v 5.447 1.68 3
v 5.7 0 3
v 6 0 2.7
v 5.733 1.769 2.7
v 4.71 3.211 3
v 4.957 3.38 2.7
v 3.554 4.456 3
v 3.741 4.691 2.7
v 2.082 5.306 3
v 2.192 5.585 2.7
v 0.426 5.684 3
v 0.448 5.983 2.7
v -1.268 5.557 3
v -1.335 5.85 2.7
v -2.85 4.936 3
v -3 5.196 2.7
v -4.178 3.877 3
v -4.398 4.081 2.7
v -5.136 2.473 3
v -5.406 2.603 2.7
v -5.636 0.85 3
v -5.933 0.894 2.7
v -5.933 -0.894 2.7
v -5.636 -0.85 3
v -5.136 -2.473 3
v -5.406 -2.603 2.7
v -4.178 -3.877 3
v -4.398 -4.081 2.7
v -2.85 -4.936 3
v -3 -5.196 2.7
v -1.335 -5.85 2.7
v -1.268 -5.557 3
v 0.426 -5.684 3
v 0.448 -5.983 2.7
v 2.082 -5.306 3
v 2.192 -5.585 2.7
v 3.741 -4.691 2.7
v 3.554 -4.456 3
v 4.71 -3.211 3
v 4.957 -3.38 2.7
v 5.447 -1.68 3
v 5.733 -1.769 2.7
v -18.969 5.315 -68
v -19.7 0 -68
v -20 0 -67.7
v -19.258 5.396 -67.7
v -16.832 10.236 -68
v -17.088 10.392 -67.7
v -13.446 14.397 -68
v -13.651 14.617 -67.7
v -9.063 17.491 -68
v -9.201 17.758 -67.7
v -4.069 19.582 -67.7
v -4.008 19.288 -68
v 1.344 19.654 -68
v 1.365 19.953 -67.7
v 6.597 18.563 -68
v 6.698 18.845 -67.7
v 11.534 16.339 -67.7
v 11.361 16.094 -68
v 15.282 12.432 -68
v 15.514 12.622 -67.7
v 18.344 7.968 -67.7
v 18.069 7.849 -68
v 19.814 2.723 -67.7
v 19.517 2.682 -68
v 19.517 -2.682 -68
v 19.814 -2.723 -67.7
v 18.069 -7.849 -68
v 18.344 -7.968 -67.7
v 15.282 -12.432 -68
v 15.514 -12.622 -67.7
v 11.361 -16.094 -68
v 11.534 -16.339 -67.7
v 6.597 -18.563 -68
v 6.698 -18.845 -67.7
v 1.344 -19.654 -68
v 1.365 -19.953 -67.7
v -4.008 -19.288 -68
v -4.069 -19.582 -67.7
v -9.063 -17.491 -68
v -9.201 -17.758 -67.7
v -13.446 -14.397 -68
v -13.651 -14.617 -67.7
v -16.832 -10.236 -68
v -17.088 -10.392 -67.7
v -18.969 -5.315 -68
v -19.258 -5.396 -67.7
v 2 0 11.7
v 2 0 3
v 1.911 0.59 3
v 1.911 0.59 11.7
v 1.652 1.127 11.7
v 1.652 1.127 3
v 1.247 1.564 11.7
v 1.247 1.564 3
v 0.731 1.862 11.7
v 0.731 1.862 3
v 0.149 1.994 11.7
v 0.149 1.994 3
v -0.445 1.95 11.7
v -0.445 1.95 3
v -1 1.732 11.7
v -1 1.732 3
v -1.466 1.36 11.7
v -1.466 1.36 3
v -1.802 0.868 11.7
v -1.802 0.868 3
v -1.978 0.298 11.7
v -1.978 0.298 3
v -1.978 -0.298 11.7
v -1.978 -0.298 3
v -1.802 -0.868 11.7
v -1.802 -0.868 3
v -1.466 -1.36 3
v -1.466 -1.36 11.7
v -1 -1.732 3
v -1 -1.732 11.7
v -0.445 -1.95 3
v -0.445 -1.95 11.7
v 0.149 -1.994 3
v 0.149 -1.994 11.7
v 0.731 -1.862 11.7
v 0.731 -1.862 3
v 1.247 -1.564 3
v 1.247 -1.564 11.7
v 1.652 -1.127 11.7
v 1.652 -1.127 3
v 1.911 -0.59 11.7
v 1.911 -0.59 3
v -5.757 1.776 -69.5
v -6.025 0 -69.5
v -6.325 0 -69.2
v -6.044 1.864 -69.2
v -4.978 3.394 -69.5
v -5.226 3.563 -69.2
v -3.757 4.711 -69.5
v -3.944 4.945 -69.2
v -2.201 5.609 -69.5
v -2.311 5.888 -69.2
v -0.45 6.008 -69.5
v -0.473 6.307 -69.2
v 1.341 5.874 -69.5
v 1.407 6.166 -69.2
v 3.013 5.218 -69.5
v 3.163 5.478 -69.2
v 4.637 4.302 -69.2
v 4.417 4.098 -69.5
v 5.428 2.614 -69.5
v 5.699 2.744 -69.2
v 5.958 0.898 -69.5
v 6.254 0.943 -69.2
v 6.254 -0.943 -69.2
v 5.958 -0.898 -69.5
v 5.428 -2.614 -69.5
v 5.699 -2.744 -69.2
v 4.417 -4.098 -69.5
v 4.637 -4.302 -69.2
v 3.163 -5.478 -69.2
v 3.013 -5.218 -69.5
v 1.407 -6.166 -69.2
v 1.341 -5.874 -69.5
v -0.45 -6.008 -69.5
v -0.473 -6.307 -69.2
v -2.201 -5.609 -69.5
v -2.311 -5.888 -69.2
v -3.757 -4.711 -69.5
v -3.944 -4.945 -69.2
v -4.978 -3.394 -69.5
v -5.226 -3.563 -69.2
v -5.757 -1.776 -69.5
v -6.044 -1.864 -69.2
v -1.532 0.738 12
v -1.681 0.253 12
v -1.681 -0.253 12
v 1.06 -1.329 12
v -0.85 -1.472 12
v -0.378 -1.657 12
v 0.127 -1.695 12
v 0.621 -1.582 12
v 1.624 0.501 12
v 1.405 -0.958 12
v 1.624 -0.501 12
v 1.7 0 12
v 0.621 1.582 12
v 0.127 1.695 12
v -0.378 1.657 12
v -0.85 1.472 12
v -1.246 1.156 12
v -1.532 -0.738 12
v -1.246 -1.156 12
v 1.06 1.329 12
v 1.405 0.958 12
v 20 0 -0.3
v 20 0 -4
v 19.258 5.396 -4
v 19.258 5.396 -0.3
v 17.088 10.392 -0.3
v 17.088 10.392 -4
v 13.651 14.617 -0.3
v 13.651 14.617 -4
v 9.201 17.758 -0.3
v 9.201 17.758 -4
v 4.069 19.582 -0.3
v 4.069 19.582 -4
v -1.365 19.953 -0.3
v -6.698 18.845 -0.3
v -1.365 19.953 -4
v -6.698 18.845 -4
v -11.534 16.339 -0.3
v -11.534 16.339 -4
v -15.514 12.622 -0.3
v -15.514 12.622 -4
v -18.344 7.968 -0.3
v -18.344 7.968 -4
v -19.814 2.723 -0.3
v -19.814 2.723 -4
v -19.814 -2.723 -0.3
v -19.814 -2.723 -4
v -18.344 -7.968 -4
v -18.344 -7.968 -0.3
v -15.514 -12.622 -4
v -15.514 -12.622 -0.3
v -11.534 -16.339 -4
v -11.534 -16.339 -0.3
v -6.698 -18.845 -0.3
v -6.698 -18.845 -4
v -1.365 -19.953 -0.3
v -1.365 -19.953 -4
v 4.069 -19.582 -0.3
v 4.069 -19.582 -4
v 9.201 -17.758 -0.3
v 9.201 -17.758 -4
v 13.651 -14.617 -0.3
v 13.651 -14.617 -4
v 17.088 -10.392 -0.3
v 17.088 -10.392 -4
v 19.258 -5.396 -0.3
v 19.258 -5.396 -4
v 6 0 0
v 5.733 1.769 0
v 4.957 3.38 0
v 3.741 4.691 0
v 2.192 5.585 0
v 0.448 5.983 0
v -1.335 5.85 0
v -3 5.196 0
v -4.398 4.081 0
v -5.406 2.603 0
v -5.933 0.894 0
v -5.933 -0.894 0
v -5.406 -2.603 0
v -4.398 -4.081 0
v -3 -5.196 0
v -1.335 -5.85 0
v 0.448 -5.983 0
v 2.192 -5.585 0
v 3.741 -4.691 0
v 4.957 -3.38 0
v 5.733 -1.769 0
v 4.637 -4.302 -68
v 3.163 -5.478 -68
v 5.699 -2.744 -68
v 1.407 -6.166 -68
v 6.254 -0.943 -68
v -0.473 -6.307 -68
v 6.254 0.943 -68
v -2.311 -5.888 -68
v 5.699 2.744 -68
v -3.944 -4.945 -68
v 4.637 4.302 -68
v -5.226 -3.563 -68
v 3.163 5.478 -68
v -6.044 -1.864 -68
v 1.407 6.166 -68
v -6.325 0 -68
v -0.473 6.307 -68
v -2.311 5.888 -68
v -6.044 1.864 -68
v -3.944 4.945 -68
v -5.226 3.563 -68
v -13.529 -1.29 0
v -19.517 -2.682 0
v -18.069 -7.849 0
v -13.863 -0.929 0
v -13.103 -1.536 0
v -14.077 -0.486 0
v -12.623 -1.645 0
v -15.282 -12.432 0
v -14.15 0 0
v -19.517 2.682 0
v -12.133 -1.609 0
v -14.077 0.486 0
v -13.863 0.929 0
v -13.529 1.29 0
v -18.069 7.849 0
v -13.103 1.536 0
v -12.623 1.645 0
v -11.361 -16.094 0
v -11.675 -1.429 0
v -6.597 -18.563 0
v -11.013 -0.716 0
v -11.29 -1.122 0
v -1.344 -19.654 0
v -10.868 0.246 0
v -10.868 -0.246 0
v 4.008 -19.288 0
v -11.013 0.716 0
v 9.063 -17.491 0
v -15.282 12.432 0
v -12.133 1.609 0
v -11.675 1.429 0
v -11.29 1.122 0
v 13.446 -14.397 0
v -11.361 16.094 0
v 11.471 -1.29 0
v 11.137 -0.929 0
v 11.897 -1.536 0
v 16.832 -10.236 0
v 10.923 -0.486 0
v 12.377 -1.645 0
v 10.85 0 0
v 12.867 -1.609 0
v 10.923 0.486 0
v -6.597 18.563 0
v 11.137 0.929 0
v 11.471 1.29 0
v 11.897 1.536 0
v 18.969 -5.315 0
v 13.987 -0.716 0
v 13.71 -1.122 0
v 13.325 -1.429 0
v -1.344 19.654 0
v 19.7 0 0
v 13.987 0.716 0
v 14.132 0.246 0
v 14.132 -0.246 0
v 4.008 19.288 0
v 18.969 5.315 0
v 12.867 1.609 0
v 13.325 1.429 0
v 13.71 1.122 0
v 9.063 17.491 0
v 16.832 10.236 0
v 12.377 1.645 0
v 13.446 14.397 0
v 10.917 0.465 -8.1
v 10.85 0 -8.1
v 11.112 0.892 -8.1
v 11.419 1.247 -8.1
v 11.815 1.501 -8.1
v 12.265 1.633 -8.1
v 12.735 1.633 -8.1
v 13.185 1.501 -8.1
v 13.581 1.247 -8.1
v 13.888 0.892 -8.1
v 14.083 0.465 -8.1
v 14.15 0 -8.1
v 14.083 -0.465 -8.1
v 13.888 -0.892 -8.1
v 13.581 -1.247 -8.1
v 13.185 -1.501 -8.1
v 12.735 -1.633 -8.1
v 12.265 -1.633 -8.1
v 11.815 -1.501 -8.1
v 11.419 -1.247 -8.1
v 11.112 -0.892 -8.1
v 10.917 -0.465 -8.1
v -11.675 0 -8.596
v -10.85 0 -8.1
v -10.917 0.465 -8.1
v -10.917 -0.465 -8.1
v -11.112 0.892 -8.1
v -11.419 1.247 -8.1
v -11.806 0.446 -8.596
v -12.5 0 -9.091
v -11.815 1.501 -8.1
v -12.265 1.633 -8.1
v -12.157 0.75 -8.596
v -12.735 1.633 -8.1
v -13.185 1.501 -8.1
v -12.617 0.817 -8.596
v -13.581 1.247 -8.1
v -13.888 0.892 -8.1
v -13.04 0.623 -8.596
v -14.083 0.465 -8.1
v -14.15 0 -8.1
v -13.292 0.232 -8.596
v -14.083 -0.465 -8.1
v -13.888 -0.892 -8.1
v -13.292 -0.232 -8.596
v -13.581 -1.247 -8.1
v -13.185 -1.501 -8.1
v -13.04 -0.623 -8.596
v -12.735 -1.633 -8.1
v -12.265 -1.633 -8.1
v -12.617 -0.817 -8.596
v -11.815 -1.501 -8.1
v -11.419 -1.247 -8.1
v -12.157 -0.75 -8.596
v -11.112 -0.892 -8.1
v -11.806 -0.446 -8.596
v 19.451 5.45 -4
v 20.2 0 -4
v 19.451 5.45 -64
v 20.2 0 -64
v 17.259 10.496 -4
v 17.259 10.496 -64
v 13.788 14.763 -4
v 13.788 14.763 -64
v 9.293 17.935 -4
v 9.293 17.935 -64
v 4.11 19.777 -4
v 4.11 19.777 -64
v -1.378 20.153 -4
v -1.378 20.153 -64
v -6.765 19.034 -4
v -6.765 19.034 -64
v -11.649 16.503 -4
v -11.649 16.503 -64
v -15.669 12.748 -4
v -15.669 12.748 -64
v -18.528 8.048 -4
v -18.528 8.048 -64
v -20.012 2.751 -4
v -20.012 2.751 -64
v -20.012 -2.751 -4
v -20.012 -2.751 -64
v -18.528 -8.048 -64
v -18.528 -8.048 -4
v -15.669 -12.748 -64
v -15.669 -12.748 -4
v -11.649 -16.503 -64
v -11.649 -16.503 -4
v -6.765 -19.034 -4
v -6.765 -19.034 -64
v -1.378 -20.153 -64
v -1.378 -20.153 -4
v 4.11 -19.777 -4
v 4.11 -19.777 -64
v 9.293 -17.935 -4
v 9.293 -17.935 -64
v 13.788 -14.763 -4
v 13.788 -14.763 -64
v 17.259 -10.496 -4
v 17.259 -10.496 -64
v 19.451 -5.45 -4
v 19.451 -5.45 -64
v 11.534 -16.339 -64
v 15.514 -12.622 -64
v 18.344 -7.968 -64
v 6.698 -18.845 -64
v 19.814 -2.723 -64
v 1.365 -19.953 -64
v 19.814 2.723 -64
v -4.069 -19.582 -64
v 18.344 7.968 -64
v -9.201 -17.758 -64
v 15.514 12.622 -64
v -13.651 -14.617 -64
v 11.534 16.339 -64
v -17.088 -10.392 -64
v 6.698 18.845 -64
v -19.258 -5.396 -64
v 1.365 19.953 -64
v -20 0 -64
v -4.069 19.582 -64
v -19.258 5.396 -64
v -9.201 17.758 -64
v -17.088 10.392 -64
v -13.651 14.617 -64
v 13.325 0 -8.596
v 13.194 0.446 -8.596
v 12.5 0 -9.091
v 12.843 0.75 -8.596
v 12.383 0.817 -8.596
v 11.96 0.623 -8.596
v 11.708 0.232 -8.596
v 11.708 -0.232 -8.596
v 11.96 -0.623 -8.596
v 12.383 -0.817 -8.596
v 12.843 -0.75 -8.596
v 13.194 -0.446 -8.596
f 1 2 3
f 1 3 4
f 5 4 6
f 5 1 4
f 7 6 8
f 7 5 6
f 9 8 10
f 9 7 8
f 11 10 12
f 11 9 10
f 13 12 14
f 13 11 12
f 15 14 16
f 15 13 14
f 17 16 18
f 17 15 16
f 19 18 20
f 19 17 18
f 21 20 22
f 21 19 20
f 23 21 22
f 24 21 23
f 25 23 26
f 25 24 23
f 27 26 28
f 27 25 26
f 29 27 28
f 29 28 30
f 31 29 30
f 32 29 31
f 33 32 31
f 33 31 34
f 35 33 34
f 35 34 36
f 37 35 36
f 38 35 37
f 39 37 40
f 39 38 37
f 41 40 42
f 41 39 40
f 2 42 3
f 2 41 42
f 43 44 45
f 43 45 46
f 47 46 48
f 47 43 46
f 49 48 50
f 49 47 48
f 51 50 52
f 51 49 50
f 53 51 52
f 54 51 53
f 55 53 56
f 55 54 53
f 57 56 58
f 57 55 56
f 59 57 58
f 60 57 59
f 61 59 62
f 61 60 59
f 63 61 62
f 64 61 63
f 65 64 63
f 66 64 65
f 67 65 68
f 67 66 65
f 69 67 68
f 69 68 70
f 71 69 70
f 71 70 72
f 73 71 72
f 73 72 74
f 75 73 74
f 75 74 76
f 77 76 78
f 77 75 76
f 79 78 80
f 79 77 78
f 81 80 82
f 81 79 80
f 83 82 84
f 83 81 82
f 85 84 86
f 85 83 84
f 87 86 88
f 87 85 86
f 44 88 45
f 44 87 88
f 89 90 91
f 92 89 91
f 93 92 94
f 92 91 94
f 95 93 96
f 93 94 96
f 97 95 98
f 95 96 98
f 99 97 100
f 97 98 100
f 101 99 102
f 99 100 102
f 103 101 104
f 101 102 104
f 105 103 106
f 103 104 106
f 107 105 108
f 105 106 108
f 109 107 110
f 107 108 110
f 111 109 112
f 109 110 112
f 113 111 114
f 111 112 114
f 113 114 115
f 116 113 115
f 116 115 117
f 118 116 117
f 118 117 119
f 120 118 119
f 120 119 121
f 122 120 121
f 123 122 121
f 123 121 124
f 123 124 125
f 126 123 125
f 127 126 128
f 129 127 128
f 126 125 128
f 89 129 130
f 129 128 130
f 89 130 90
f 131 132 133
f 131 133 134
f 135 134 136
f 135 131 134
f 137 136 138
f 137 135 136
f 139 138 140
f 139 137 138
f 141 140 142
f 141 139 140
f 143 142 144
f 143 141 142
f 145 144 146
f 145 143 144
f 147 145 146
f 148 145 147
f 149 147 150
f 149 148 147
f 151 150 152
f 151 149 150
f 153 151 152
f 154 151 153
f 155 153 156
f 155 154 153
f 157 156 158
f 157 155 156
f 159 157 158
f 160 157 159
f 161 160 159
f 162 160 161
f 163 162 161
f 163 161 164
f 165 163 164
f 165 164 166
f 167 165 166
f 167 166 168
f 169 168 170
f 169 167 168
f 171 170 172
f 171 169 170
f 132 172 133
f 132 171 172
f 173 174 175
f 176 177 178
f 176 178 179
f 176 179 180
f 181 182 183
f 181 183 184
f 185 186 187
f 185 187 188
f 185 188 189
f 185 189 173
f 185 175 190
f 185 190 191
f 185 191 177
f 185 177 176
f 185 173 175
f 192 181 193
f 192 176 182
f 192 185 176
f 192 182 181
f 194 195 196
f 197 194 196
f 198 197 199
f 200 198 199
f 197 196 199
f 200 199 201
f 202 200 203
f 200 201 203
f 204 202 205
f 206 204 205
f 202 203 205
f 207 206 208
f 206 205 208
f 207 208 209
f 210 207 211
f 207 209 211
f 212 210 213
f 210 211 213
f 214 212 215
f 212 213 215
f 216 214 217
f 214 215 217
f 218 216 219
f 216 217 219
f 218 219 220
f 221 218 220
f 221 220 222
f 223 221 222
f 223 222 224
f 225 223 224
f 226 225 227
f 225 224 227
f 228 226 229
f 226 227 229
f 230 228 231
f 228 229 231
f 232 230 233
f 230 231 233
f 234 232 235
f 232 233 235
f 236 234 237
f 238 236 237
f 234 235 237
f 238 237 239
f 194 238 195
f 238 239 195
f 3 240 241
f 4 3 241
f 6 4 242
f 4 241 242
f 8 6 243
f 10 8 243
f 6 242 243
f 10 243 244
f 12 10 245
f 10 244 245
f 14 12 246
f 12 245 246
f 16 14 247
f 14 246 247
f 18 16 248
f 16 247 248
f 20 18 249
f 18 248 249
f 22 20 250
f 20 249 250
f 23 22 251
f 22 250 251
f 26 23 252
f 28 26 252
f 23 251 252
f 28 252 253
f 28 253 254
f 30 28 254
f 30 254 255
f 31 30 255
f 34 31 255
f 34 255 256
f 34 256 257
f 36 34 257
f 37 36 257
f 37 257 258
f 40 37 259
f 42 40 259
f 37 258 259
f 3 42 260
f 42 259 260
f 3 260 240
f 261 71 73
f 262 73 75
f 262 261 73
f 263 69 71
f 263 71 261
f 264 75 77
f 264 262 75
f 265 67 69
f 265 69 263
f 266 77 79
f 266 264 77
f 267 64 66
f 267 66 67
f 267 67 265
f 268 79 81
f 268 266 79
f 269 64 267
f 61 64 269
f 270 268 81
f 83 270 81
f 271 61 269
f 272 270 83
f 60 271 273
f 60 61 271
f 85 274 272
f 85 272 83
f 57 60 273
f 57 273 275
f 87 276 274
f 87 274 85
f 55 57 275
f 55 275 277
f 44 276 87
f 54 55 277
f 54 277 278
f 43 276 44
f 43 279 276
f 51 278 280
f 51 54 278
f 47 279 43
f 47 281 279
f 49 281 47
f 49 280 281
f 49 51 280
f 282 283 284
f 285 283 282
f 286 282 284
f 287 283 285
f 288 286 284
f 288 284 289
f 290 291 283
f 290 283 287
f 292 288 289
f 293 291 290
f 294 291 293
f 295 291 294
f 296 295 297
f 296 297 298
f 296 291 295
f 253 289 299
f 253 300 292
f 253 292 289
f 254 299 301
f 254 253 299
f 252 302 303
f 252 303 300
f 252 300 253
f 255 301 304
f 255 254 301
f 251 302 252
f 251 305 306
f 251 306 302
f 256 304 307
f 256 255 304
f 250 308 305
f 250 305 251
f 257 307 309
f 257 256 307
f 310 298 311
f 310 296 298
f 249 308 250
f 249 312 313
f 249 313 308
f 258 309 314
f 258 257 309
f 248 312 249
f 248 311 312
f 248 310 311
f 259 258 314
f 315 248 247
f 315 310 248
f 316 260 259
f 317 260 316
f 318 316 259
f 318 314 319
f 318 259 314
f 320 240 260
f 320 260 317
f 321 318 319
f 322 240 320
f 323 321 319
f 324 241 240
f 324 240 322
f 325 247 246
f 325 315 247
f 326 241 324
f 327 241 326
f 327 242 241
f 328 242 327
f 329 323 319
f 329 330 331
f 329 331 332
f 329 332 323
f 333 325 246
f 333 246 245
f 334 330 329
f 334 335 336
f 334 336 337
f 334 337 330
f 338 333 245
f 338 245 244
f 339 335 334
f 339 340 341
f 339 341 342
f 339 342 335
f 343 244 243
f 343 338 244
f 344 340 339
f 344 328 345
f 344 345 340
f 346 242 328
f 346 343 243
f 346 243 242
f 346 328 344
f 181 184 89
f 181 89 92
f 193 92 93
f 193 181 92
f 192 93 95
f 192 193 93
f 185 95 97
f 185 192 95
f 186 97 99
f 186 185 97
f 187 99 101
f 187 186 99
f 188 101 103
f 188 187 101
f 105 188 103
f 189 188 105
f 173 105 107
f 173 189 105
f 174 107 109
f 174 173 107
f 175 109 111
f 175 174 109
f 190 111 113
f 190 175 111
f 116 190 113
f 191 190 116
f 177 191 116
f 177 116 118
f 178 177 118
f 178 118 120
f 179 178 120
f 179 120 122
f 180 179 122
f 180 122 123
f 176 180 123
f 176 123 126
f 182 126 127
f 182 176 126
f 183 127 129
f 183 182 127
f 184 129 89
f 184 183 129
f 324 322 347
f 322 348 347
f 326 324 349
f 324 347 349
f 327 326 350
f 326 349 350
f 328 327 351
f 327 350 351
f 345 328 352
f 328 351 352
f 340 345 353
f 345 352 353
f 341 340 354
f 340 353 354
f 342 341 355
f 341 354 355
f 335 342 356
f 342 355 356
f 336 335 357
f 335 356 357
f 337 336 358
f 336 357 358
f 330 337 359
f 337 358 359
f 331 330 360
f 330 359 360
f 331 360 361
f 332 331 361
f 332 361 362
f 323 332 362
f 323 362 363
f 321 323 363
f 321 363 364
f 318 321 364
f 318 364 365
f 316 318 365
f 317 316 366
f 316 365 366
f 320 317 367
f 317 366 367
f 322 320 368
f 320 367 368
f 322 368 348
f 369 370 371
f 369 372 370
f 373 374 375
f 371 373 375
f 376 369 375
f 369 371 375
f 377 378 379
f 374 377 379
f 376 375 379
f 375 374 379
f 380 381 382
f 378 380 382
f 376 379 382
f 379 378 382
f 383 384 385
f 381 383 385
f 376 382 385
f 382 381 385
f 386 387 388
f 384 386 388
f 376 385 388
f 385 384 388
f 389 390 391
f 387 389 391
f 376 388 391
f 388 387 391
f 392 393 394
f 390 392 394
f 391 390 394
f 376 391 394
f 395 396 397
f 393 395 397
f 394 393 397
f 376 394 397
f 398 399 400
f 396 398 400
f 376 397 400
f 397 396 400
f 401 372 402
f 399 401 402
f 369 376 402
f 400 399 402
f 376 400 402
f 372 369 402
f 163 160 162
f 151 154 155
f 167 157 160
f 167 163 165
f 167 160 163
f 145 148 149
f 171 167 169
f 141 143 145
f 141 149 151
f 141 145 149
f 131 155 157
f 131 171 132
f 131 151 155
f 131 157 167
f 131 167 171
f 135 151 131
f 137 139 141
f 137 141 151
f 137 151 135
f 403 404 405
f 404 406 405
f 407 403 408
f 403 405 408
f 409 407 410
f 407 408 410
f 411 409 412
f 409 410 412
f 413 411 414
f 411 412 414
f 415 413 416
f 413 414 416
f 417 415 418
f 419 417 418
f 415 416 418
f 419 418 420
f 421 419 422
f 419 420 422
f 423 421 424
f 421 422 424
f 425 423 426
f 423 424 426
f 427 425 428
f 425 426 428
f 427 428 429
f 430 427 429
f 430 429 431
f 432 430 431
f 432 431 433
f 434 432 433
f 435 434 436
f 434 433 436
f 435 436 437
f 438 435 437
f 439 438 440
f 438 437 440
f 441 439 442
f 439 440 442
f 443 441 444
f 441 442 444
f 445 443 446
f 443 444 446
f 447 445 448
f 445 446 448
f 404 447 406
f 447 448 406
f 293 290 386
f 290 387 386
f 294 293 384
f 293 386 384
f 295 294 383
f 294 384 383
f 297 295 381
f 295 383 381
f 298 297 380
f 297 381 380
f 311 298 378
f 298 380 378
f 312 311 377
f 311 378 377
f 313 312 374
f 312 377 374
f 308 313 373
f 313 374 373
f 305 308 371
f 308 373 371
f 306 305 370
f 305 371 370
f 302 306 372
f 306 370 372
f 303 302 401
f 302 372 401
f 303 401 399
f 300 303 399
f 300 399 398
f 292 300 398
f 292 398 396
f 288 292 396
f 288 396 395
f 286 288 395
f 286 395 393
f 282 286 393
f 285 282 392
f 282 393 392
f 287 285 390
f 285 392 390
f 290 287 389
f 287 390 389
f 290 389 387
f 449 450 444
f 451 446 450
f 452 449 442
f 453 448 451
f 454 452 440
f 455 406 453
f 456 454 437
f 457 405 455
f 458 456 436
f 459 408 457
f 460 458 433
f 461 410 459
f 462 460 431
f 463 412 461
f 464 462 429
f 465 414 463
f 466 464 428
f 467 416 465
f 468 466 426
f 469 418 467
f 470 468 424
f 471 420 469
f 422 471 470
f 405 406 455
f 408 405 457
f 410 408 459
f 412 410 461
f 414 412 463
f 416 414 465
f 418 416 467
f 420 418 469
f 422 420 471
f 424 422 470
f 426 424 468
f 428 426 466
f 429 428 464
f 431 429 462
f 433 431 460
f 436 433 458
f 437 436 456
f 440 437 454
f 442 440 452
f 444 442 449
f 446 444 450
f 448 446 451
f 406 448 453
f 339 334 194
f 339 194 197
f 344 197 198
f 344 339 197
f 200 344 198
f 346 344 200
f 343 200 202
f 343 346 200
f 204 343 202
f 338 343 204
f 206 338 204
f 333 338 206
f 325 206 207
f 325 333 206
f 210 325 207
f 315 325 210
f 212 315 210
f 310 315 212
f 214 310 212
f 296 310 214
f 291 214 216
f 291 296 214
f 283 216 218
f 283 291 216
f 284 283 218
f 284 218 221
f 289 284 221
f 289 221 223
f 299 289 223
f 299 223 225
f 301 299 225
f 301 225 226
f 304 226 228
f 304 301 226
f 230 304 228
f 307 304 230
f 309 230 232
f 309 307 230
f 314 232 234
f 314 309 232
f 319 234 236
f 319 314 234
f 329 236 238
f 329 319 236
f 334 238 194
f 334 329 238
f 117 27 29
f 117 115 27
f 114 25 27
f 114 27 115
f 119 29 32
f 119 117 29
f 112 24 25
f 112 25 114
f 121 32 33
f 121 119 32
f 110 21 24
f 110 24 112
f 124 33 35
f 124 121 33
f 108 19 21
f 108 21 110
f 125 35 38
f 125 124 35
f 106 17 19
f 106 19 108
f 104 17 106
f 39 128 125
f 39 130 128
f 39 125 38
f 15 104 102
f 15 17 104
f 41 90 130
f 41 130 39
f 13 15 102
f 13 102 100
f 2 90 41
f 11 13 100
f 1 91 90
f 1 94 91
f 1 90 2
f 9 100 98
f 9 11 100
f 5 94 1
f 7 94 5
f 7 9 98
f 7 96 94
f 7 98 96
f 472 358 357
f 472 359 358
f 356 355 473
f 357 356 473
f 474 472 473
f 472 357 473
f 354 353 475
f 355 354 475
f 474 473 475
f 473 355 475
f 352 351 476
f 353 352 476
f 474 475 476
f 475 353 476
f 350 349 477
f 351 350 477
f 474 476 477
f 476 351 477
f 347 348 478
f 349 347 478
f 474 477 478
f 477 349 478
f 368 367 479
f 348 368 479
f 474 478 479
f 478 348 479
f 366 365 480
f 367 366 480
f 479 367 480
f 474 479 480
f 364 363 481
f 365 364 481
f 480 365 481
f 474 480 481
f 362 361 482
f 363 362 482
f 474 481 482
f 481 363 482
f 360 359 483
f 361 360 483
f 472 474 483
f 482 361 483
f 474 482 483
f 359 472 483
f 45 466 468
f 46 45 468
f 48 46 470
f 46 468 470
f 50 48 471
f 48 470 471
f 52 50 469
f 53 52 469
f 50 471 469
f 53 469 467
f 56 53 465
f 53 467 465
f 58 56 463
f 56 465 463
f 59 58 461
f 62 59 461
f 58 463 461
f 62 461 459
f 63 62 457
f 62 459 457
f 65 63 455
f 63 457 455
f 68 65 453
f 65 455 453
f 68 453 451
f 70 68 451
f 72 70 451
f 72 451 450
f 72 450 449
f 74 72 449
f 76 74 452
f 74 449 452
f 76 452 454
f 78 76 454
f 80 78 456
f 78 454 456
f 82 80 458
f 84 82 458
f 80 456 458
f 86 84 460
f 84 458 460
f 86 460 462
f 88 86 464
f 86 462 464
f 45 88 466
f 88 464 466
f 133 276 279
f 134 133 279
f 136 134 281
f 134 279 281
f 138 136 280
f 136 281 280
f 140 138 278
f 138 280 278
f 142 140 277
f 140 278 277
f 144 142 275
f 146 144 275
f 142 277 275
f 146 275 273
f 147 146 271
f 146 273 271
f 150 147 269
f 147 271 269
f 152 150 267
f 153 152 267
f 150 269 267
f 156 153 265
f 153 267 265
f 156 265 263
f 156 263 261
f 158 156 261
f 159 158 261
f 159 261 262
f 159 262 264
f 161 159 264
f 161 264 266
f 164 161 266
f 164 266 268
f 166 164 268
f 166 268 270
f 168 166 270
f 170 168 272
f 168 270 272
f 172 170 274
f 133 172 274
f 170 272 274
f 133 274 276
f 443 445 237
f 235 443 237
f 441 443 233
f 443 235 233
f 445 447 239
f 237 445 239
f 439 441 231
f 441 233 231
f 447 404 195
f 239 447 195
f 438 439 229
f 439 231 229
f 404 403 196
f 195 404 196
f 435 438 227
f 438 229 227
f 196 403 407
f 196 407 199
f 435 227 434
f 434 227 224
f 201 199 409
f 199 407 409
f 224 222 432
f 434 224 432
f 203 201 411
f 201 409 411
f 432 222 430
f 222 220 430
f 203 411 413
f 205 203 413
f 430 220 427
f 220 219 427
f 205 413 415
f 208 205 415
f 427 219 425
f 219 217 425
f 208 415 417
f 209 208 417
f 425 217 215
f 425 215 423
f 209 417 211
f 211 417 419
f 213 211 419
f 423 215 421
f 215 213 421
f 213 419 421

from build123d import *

# Parameters (mm, degrees)
SKETCH1_W                      = 20.2
SKETCH1_H                      = 60
SKETCH2_R                      = 20
BOSS_EXTRUDE1_DEPTH            = 4
SKETCH3_R                      = 6
BOSS_EXTRUDE2_DEPTH            = 3
SKETCH4_R                      = 2
BOSS_EXTRUDE3_DEPTH            = 9
SKETCH5_R                      = 20
BOSS_EXTRUDE4_DEPTH            = 4
SKETCH6_R                      = 6.325
BOSS_EXTRUDE5_DEPTH            = 1.5
F_3_3_3_3_DIAMETER_HOLE1_D     = 3.3
F_3_3_3_3_DIAMETER_HOLE1_DEPTH = 8.1
F_3_3_3_3_DIAMETER_HOLE1_TIP   = 0.991420021
CHAMFER1_SIZE                  = 0.3


with BuildPart() as part:
    # Sketch1 → Revolve1 (revolve)
    with BuildSketch(Plane(origin=(0, 0, 0), x_dir=(1, 0, 0), z_dir=(0, 1, 0))):
        with Locations((10.1, 34)):
            Rectangle(SKETCH1_W, SKETCH1_H)
    revolve(axis=Axis((0, 0, -64), (0, 0, 1)))

    # Sketch2 → Boss-Extrude1 (add)
    with BuildSketch(Plane.XY.offset(-4)):
        Circle(SKETCH2_R)
    extrude(amount=BOSS_EXTRUDE1_DEPTH)

    # Sketch3 → Boss-Extrude2 (add)
    with BuildSketch(Plane.XY):
        Circle(SKETCH3_R)
    extrude(amount=BOSS_EXTRUDE2_DEPTH)

    # Sketch4 → Boss-Extrude3 (add)
    with BuildSketch(Plane.XY.offset(3)):
        Circle(SKETCH4_R)
    extrude(amount=BOSS_EXTRUDE3_DEPTH)

    # Sketch5 → Boss-Extrude4 (add)
    with BuildSketch(Plane(origin=(0, 0, -64), x_dir=(-1, 0, 0), z_dir=(0, 0, -1))):
        Circle(SKETCH5_R)
    extrude(amount=BOSS_EXTRUDE4_DEPTH)

    # Sketch6 → Boss-Extrude5 (add)
    with BuildSketch(Plane(origin=(0, 0, -68), x_dir=(-1, 0, 0), z_dir=(0, 0, -1))):
        Circle(SKETCH6_R)
    extrude(amount=BOSS_EXTRUDE5_DEPTH)

    # Ø3.3 (3.3) Diameter Hole1
    with Locations(Plane.XY):
        with Locations((-12.5, 0), (12.5, 0)):
            Hole(F_3_3_3_3_DIAMETER_HOLE1_D / 2, depth=F_3_3_3_3_DIAMETER_HOLE1_DEPTH)
            with Locations((0, 0, -(F_3_3_3_3_DIAMETER_HOLE1_DEPTH + F_3_3_3_3_DIAMETER_HOLE1_TIP / 2))):  # 118° drill point
                Cone(0, F_3_3_3_3_DIAMETER_HOLE1_D / 2, F_3_3_3_3_DIAMETER_HOLE1_TIP, mode=Mode.SUBTRACT)

    # Chamfer1
    chamfer1_edges = [part.edges().sort_by_distance(p)[0] for p in [
        (-6, 0, 3),
        (-2, 0, 12),
        (20, 0, -68),
        (6.325, 0, -69.5),
        (-20, 0, 0),
    ]]
    chamfer(chamfer1_edges, length=CHAMFER1_SIZE)


solid = part.part
